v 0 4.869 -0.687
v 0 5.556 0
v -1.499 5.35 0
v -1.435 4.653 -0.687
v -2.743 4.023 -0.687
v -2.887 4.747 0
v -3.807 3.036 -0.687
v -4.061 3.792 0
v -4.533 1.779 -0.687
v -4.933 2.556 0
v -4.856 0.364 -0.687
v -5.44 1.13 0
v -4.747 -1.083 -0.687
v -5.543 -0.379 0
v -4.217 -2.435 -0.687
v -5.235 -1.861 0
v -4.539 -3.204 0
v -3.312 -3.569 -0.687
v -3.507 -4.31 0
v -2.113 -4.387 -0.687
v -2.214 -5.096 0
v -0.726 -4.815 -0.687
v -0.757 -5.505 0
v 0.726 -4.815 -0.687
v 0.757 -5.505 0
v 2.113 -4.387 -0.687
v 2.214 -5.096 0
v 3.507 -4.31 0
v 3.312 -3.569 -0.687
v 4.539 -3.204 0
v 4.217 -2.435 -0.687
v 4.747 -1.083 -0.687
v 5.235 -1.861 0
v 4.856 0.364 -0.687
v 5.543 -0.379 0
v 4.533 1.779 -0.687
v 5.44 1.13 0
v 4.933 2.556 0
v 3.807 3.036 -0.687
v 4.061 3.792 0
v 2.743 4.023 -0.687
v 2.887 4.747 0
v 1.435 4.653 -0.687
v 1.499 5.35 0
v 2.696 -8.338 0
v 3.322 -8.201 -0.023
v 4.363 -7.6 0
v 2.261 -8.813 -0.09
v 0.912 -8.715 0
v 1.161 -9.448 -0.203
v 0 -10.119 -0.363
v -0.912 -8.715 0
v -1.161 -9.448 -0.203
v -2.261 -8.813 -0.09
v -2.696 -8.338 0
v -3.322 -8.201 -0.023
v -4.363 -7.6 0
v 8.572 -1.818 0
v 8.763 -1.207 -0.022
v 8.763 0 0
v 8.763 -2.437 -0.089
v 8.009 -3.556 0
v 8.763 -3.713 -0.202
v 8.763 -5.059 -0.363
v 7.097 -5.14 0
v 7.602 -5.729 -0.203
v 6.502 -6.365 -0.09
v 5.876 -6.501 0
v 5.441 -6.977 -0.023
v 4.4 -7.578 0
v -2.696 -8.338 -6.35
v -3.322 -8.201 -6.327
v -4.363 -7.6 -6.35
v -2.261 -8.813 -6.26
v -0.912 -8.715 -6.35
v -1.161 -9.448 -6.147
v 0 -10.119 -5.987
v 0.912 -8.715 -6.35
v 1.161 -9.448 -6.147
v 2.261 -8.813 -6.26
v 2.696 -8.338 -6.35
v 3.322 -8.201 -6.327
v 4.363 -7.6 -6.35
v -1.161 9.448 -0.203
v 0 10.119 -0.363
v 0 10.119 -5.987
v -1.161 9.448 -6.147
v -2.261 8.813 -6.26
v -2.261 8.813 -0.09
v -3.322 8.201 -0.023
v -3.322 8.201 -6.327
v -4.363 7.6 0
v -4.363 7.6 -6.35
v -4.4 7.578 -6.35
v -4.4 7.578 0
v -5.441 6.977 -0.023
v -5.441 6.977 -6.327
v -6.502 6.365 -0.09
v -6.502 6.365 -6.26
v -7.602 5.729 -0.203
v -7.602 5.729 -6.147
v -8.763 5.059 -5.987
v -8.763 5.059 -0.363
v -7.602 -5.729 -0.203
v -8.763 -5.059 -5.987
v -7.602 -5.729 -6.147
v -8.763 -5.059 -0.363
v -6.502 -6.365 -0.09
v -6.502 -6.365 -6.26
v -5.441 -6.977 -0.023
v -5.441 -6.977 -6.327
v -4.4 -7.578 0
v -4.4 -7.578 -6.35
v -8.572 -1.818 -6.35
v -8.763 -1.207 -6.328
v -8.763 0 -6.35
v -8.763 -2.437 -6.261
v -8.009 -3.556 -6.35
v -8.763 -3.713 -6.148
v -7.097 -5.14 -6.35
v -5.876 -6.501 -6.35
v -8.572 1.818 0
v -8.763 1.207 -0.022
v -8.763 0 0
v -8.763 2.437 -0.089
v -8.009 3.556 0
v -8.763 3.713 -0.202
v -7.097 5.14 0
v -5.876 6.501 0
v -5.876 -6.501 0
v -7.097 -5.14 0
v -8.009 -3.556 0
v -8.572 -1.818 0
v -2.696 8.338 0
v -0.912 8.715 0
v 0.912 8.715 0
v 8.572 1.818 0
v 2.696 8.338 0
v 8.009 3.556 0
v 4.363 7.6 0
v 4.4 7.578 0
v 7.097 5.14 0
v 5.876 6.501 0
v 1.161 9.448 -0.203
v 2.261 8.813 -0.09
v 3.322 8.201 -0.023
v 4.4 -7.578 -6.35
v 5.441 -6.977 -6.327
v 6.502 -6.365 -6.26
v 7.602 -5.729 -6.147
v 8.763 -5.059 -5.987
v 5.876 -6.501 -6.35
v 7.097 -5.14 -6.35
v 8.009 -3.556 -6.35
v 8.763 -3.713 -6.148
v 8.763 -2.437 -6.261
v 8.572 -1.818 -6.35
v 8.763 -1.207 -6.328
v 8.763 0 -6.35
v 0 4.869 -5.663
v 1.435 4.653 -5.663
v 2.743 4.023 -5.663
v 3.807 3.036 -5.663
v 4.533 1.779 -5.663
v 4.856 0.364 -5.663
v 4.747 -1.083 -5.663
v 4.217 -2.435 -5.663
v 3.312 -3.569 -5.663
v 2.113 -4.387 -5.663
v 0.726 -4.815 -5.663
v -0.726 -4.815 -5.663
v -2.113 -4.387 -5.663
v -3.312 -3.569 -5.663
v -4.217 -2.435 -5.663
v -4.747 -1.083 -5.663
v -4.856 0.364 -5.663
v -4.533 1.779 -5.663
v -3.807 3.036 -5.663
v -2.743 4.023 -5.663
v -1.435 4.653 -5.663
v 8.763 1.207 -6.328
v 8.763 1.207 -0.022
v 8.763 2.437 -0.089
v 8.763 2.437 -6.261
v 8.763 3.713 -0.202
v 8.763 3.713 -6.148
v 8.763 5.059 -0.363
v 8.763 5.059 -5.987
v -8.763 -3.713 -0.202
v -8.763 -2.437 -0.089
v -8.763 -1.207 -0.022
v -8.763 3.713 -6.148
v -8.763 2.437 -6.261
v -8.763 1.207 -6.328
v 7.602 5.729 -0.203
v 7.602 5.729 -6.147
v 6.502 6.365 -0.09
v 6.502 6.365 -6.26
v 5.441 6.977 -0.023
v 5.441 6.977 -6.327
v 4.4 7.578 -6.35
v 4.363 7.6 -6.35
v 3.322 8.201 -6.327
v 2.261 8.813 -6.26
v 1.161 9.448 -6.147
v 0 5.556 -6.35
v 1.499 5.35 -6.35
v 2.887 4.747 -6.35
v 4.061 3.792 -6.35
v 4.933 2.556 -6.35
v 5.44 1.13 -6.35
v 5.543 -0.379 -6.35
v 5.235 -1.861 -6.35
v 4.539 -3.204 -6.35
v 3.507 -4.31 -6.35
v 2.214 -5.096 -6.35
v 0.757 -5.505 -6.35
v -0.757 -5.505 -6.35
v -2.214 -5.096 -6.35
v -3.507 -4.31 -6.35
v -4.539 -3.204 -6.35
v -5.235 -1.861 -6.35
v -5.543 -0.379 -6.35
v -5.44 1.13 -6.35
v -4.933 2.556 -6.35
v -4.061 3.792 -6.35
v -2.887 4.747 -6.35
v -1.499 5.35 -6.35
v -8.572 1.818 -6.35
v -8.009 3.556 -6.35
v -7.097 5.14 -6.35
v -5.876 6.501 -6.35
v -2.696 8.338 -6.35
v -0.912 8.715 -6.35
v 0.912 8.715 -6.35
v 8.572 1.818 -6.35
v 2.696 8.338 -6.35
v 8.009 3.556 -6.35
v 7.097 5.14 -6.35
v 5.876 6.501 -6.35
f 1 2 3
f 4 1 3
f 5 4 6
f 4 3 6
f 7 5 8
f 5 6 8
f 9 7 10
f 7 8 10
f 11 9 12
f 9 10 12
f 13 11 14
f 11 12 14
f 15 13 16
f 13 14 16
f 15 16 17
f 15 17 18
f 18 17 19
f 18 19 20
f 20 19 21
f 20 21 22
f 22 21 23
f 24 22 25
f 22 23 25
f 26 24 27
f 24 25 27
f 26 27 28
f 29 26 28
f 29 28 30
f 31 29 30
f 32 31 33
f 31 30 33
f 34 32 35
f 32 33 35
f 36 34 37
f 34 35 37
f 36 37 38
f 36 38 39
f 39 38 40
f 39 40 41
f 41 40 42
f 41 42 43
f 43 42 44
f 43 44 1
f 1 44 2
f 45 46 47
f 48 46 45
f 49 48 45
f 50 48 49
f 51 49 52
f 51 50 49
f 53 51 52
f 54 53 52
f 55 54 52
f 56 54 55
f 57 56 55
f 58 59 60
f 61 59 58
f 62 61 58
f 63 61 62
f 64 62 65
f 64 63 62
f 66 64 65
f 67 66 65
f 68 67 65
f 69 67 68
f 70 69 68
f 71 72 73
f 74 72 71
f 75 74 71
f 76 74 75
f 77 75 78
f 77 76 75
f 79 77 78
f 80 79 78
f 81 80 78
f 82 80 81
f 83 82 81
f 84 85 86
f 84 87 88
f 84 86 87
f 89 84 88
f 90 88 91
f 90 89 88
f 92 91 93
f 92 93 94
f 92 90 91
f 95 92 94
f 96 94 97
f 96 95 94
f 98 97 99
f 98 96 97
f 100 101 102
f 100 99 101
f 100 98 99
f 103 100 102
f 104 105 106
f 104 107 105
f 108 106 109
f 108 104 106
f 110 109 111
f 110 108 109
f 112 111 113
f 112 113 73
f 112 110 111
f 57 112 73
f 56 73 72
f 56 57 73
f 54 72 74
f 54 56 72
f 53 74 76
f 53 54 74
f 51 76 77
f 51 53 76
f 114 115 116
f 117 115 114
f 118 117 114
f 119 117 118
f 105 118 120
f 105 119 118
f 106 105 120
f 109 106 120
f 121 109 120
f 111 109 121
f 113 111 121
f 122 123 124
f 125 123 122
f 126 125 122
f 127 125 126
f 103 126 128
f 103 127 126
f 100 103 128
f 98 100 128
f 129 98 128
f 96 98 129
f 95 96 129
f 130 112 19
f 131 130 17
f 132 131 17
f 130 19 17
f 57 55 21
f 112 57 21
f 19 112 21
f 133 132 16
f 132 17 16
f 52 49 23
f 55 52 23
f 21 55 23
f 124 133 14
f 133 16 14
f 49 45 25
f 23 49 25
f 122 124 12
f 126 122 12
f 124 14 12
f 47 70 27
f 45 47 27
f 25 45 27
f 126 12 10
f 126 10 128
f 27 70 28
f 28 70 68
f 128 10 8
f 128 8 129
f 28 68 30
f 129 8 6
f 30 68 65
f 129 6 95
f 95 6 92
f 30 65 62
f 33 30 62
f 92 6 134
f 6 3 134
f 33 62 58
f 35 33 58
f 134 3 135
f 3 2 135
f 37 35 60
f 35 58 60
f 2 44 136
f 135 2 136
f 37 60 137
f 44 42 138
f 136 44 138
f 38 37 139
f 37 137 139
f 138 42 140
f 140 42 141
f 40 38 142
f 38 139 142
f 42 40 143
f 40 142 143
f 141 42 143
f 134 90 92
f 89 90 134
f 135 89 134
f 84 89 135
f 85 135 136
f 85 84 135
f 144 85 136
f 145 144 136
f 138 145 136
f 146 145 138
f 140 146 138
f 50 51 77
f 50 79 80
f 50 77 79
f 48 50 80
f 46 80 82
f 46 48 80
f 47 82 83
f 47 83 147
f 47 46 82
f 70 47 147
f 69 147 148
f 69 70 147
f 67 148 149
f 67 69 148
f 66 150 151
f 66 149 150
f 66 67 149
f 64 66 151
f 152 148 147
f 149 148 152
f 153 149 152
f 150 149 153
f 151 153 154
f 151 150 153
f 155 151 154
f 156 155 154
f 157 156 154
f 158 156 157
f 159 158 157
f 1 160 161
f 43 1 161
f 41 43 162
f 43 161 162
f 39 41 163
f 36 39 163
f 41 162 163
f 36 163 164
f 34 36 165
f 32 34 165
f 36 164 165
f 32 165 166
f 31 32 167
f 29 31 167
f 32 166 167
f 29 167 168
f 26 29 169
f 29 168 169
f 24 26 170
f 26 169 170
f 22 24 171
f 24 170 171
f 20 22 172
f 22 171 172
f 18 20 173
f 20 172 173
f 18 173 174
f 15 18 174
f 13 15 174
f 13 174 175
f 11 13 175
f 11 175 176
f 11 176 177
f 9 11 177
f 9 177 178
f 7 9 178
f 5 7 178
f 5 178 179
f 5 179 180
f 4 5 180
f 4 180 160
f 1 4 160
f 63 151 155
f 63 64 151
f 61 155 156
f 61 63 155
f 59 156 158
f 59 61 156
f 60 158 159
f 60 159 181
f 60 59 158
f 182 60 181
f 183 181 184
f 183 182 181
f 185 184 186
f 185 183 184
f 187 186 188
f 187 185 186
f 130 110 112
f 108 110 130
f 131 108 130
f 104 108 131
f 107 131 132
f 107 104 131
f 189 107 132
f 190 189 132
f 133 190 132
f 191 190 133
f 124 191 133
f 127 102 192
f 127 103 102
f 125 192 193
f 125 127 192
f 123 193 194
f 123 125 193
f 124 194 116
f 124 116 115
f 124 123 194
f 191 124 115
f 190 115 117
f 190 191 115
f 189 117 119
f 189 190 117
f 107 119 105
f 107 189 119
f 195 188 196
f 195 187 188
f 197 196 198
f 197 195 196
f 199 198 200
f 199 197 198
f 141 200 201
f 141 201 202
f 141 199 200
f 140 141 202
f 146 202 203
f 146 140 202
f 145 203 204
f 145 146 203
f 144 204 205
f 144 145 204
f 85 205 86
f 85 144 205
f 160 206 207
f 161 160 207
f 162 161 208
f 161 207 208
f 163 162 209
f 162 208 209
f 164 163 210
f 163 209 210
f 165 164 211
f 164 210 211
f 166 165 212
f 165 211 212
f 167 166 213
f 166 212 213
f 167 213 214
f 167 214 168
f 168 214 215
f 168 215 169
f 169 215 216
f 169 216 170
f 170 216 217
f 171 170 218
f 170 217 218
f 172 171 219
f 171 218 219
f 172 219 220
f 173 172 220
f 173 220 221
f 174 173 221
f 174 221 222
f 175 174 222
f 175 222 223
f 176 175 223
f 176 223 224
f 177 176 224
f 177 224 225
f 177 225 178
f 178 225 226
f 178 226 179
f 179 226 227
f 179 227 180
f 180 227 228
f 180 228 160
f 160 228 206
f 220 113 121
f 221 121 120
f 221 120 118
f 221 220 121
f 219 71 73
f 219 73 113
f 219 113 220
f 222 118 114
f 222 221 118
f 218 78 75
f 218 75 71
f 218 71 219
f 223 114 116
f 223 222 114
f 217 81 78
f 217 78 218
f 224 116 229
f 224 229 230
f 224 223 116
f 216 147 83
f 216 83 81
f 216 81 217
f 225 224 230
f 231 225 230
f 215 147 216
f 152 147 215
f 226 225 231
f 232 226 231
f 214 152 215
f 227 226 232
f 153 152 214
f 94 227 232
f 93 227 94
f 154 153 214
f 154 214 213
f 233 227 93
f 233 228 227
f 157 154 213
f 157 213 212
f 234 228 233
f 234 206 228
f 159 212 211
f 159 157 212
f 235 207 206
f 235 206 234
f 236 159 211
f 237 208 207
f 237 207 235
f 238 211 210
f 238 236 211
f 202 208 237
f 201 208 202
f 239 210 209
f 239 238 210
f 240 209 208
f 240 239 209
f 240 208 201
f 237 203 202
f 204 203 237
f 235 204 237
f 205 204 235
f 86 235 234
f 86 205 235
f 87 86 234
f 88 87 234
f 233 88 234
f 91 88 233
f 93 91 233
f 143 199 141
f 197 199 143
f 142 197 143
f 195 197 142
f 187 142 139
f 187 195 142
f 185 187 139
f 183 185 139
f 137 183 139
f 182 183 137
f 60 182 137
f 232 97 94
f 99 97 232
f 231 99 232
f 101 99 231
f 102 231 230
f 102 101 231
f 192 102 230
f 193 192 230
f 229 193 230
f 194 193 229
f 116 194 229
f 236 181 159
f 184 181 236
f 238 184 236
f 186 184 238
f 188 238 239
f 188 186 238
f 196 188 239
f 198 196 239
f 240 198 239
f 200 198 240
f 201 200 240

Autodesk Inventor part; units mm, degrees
sketch "Sketch_8" plane through (0, 0, 0) normal (1, 0, 0) x (0, 1, 0)
  line L0 (0, -6.35) -> (0, 0)
  line L1 (0, 0) -> (8.763, 0)
  line L2 (8.763, 0) -> (10.5156, -0.4696)
  line L3 (10.5156, -0.4696) -> (10.5156, -5.8804)
  line L4 (10.5156, -5.8804) -> (8.763, -6.35)
  line L5 (8.763, -6.35) -> (0, -6.35)
  line L6 (0, -6.35) -> (0, 0)
sketch "Sketch_10" plane through (0, 0, 0) normal (0, 0, 1) x (1, 0, 0)
  line L0 (-17.526, -17.526) -> (17.526, -17.526)
  line L1 (17.526, -17.526) -> (17.526, 17.526)
  line L2 (17.526, 17.526) -> (-17.526, 17.526)
  line L3 (-17.526, 17.526) -> (-17.526, -17.526)
  line L4 (-8.763, -5.0593) -> (0, -10.1186)
  line L5 (0, -10.1186) -> (8.763, -5.0593)
  line L6 (8.763, -5.0593) -> (8.763, 5.0593)
  line L7 (8.763, 5.0593) -> (0, 10.1186)
  line L8 (0, 10.1186) -> (-8.763, 5.0593)
  line L9 (-8.763, 5.0593) -> (-8.763, -5.0593)
revolve "Revolution1" add sketch "Sketch_8" angle 360 about axis through (0, 0, -6.35) along (0, 0, -1)
extrude "Extrusion1" cut sketch "Sketch_10" against normal blind 6.35
sketch "Sketch_11" plane through (0, 0, 0) normal (1, 0, 0) x (0, 1, 0)
  line L0 (0, -6.35) -> (0, 0)
  line L1 (0, 0) -> (5.5563, 0)
  line L2 (5.5563, 0) -> (4.8692, -0.6871)
  line L3 (4.8692, -0.6871) -> (4.8692, -5.6629)
  line L4 (4.8692, -5.6629) -> (5.5563, -6.35)
  line L5 (5.5563, -6.35) -> (0, -6.35)
  line L6 (0, -6.35) -> (0, 0)
revolve "Revolution2" cut sketch "Sketch_11" angle 360 about axis through (0, 0, -6.35) along (0, 0, -1)
thread "Thread1" size "7/16-20 UNF" class "2B" standard "ANSI Unified Screw Threads" full length
ref_plane "NUT_XY" through (0, 0, 0) normal (0, 0, 1) x (1, 0, 0)
ref_plane "NUT_YZ" through (0, 0, 0) normal (1, 0, 0) x (0, 1, 0)
ref_plane "NUT_ZX" through (0, 0, 0) normal (0, 1, 0) x (0, 0, 1)
ref_plane "a1_XY" through (-8.763, 8.763, 0) normal (0, 0, 1) x (1, 0, 0)
ref_plane "a1_YZ" through (-8.763, 8.763, 0) normal (1, 0, 0) x (0, 1, 0)
ref_plane "a1_ZX" through (-8.763, 8.763, 0) normal (0, 1, 0) x (0, 0, 1)
ref_plane "a2_XY" through (8.763, 8.763, 0) normal (0, 0, 1) x (1, 0, 0)
ref_plane "a2_YZ" through (8.763, 8.763, 0) normal (1, 0, 0) x (0, 1, 0)
ref_plane "a2_ZX" through (8.763, 8.763, 0) normal (0, 1, 0) x (0, 0, 1)
ref_plane "b1_XY" through (0, 8.763, 0) normal (1, 0, 0) x (0, 0, -1)
ref_plane "b1_YZ" through (0, 8.763, 0) normal (0, 0, -1) x (0, 1, 0)
ref_plane "b1_ZX" through (0, 8.763, 0) normal (0, 1, 0) x (1, 0, 0)
ref_plane "b2_XY" through (0, 8.763, -6.35) normal (1, 0, 0) x (0, 0, -1)
ref_plane "b2_YZ" through (0, 8.763, -6.35) normal (0, 0, -1) x (0, 1, 0)
ref_plane "b2_ZX" through (0, 8.763, -6.35) normal (0, 1, 0) x (1, 0, 0)
ref_plane "e_XY" through (0, 0, -6.35) normal (1, 0, 0) x (0, 0, -1)
ref_plane "e_YZ" through (0, 0, -6.35) normal (0, 0, -1) x (0, 1, 0)
ref_plane "e_ZX" through (0, 0, -6.35) normal (0, 1, 0) x (1, 0, 0)
ref_plane "ol1_XY" through (0, 0, -8.763) normal (0, 1, 0) x (1, 0, 0)
ref_plane "ol1_YZ" through (0, 0, -8.763) normal (1, 0, 0) x (0, 0, -1)
ref_plane "ol1_ZX" through (0, 0, -8.763) normal (0, 0, -1) x (0, 1, 0)
ref_plane "ol2_XY" through (6.35, 0, -8.763) normal (0, 1, 0) x (1, 0, 0)
ref_plane "ol2_YZ" through (6.35, 0, -8.763) normal (1, 0, 0) x (0, 0, -1)
ref_plane "ol2_ZX" through (6.35, 0, -8.763) normal (0, 0, -1) x (0, 1, 0)
ref_plane "th1_XY" through (0, 5.5563, -6.35) normal (1, 0, 0) x (0, 0, -1)
ref_plane "th1_YZ" through (0, 5.5563, -6.35) normal (0, 0, -1) x (0, 1, 0)
ref_plane "th1_ZX" through (0, 5.5563, -6.35) normal (0, 1, 0) x (1, 0, 0)
ref_plane "th2_XY" through (0, -5.5563, -6.35) normal (1, 0, 0) x (0, 0, -1)
ref_plane "th2_YZ" through (0, -5.5563, -6.35) normal (0, 0, -1) x (0, 1, 0)
ref_plane "th2_ZX" through (0, -5.5563, -6.35) normal (0, 1, 0) x (1, 0, 0)
properties part number "D-154"
